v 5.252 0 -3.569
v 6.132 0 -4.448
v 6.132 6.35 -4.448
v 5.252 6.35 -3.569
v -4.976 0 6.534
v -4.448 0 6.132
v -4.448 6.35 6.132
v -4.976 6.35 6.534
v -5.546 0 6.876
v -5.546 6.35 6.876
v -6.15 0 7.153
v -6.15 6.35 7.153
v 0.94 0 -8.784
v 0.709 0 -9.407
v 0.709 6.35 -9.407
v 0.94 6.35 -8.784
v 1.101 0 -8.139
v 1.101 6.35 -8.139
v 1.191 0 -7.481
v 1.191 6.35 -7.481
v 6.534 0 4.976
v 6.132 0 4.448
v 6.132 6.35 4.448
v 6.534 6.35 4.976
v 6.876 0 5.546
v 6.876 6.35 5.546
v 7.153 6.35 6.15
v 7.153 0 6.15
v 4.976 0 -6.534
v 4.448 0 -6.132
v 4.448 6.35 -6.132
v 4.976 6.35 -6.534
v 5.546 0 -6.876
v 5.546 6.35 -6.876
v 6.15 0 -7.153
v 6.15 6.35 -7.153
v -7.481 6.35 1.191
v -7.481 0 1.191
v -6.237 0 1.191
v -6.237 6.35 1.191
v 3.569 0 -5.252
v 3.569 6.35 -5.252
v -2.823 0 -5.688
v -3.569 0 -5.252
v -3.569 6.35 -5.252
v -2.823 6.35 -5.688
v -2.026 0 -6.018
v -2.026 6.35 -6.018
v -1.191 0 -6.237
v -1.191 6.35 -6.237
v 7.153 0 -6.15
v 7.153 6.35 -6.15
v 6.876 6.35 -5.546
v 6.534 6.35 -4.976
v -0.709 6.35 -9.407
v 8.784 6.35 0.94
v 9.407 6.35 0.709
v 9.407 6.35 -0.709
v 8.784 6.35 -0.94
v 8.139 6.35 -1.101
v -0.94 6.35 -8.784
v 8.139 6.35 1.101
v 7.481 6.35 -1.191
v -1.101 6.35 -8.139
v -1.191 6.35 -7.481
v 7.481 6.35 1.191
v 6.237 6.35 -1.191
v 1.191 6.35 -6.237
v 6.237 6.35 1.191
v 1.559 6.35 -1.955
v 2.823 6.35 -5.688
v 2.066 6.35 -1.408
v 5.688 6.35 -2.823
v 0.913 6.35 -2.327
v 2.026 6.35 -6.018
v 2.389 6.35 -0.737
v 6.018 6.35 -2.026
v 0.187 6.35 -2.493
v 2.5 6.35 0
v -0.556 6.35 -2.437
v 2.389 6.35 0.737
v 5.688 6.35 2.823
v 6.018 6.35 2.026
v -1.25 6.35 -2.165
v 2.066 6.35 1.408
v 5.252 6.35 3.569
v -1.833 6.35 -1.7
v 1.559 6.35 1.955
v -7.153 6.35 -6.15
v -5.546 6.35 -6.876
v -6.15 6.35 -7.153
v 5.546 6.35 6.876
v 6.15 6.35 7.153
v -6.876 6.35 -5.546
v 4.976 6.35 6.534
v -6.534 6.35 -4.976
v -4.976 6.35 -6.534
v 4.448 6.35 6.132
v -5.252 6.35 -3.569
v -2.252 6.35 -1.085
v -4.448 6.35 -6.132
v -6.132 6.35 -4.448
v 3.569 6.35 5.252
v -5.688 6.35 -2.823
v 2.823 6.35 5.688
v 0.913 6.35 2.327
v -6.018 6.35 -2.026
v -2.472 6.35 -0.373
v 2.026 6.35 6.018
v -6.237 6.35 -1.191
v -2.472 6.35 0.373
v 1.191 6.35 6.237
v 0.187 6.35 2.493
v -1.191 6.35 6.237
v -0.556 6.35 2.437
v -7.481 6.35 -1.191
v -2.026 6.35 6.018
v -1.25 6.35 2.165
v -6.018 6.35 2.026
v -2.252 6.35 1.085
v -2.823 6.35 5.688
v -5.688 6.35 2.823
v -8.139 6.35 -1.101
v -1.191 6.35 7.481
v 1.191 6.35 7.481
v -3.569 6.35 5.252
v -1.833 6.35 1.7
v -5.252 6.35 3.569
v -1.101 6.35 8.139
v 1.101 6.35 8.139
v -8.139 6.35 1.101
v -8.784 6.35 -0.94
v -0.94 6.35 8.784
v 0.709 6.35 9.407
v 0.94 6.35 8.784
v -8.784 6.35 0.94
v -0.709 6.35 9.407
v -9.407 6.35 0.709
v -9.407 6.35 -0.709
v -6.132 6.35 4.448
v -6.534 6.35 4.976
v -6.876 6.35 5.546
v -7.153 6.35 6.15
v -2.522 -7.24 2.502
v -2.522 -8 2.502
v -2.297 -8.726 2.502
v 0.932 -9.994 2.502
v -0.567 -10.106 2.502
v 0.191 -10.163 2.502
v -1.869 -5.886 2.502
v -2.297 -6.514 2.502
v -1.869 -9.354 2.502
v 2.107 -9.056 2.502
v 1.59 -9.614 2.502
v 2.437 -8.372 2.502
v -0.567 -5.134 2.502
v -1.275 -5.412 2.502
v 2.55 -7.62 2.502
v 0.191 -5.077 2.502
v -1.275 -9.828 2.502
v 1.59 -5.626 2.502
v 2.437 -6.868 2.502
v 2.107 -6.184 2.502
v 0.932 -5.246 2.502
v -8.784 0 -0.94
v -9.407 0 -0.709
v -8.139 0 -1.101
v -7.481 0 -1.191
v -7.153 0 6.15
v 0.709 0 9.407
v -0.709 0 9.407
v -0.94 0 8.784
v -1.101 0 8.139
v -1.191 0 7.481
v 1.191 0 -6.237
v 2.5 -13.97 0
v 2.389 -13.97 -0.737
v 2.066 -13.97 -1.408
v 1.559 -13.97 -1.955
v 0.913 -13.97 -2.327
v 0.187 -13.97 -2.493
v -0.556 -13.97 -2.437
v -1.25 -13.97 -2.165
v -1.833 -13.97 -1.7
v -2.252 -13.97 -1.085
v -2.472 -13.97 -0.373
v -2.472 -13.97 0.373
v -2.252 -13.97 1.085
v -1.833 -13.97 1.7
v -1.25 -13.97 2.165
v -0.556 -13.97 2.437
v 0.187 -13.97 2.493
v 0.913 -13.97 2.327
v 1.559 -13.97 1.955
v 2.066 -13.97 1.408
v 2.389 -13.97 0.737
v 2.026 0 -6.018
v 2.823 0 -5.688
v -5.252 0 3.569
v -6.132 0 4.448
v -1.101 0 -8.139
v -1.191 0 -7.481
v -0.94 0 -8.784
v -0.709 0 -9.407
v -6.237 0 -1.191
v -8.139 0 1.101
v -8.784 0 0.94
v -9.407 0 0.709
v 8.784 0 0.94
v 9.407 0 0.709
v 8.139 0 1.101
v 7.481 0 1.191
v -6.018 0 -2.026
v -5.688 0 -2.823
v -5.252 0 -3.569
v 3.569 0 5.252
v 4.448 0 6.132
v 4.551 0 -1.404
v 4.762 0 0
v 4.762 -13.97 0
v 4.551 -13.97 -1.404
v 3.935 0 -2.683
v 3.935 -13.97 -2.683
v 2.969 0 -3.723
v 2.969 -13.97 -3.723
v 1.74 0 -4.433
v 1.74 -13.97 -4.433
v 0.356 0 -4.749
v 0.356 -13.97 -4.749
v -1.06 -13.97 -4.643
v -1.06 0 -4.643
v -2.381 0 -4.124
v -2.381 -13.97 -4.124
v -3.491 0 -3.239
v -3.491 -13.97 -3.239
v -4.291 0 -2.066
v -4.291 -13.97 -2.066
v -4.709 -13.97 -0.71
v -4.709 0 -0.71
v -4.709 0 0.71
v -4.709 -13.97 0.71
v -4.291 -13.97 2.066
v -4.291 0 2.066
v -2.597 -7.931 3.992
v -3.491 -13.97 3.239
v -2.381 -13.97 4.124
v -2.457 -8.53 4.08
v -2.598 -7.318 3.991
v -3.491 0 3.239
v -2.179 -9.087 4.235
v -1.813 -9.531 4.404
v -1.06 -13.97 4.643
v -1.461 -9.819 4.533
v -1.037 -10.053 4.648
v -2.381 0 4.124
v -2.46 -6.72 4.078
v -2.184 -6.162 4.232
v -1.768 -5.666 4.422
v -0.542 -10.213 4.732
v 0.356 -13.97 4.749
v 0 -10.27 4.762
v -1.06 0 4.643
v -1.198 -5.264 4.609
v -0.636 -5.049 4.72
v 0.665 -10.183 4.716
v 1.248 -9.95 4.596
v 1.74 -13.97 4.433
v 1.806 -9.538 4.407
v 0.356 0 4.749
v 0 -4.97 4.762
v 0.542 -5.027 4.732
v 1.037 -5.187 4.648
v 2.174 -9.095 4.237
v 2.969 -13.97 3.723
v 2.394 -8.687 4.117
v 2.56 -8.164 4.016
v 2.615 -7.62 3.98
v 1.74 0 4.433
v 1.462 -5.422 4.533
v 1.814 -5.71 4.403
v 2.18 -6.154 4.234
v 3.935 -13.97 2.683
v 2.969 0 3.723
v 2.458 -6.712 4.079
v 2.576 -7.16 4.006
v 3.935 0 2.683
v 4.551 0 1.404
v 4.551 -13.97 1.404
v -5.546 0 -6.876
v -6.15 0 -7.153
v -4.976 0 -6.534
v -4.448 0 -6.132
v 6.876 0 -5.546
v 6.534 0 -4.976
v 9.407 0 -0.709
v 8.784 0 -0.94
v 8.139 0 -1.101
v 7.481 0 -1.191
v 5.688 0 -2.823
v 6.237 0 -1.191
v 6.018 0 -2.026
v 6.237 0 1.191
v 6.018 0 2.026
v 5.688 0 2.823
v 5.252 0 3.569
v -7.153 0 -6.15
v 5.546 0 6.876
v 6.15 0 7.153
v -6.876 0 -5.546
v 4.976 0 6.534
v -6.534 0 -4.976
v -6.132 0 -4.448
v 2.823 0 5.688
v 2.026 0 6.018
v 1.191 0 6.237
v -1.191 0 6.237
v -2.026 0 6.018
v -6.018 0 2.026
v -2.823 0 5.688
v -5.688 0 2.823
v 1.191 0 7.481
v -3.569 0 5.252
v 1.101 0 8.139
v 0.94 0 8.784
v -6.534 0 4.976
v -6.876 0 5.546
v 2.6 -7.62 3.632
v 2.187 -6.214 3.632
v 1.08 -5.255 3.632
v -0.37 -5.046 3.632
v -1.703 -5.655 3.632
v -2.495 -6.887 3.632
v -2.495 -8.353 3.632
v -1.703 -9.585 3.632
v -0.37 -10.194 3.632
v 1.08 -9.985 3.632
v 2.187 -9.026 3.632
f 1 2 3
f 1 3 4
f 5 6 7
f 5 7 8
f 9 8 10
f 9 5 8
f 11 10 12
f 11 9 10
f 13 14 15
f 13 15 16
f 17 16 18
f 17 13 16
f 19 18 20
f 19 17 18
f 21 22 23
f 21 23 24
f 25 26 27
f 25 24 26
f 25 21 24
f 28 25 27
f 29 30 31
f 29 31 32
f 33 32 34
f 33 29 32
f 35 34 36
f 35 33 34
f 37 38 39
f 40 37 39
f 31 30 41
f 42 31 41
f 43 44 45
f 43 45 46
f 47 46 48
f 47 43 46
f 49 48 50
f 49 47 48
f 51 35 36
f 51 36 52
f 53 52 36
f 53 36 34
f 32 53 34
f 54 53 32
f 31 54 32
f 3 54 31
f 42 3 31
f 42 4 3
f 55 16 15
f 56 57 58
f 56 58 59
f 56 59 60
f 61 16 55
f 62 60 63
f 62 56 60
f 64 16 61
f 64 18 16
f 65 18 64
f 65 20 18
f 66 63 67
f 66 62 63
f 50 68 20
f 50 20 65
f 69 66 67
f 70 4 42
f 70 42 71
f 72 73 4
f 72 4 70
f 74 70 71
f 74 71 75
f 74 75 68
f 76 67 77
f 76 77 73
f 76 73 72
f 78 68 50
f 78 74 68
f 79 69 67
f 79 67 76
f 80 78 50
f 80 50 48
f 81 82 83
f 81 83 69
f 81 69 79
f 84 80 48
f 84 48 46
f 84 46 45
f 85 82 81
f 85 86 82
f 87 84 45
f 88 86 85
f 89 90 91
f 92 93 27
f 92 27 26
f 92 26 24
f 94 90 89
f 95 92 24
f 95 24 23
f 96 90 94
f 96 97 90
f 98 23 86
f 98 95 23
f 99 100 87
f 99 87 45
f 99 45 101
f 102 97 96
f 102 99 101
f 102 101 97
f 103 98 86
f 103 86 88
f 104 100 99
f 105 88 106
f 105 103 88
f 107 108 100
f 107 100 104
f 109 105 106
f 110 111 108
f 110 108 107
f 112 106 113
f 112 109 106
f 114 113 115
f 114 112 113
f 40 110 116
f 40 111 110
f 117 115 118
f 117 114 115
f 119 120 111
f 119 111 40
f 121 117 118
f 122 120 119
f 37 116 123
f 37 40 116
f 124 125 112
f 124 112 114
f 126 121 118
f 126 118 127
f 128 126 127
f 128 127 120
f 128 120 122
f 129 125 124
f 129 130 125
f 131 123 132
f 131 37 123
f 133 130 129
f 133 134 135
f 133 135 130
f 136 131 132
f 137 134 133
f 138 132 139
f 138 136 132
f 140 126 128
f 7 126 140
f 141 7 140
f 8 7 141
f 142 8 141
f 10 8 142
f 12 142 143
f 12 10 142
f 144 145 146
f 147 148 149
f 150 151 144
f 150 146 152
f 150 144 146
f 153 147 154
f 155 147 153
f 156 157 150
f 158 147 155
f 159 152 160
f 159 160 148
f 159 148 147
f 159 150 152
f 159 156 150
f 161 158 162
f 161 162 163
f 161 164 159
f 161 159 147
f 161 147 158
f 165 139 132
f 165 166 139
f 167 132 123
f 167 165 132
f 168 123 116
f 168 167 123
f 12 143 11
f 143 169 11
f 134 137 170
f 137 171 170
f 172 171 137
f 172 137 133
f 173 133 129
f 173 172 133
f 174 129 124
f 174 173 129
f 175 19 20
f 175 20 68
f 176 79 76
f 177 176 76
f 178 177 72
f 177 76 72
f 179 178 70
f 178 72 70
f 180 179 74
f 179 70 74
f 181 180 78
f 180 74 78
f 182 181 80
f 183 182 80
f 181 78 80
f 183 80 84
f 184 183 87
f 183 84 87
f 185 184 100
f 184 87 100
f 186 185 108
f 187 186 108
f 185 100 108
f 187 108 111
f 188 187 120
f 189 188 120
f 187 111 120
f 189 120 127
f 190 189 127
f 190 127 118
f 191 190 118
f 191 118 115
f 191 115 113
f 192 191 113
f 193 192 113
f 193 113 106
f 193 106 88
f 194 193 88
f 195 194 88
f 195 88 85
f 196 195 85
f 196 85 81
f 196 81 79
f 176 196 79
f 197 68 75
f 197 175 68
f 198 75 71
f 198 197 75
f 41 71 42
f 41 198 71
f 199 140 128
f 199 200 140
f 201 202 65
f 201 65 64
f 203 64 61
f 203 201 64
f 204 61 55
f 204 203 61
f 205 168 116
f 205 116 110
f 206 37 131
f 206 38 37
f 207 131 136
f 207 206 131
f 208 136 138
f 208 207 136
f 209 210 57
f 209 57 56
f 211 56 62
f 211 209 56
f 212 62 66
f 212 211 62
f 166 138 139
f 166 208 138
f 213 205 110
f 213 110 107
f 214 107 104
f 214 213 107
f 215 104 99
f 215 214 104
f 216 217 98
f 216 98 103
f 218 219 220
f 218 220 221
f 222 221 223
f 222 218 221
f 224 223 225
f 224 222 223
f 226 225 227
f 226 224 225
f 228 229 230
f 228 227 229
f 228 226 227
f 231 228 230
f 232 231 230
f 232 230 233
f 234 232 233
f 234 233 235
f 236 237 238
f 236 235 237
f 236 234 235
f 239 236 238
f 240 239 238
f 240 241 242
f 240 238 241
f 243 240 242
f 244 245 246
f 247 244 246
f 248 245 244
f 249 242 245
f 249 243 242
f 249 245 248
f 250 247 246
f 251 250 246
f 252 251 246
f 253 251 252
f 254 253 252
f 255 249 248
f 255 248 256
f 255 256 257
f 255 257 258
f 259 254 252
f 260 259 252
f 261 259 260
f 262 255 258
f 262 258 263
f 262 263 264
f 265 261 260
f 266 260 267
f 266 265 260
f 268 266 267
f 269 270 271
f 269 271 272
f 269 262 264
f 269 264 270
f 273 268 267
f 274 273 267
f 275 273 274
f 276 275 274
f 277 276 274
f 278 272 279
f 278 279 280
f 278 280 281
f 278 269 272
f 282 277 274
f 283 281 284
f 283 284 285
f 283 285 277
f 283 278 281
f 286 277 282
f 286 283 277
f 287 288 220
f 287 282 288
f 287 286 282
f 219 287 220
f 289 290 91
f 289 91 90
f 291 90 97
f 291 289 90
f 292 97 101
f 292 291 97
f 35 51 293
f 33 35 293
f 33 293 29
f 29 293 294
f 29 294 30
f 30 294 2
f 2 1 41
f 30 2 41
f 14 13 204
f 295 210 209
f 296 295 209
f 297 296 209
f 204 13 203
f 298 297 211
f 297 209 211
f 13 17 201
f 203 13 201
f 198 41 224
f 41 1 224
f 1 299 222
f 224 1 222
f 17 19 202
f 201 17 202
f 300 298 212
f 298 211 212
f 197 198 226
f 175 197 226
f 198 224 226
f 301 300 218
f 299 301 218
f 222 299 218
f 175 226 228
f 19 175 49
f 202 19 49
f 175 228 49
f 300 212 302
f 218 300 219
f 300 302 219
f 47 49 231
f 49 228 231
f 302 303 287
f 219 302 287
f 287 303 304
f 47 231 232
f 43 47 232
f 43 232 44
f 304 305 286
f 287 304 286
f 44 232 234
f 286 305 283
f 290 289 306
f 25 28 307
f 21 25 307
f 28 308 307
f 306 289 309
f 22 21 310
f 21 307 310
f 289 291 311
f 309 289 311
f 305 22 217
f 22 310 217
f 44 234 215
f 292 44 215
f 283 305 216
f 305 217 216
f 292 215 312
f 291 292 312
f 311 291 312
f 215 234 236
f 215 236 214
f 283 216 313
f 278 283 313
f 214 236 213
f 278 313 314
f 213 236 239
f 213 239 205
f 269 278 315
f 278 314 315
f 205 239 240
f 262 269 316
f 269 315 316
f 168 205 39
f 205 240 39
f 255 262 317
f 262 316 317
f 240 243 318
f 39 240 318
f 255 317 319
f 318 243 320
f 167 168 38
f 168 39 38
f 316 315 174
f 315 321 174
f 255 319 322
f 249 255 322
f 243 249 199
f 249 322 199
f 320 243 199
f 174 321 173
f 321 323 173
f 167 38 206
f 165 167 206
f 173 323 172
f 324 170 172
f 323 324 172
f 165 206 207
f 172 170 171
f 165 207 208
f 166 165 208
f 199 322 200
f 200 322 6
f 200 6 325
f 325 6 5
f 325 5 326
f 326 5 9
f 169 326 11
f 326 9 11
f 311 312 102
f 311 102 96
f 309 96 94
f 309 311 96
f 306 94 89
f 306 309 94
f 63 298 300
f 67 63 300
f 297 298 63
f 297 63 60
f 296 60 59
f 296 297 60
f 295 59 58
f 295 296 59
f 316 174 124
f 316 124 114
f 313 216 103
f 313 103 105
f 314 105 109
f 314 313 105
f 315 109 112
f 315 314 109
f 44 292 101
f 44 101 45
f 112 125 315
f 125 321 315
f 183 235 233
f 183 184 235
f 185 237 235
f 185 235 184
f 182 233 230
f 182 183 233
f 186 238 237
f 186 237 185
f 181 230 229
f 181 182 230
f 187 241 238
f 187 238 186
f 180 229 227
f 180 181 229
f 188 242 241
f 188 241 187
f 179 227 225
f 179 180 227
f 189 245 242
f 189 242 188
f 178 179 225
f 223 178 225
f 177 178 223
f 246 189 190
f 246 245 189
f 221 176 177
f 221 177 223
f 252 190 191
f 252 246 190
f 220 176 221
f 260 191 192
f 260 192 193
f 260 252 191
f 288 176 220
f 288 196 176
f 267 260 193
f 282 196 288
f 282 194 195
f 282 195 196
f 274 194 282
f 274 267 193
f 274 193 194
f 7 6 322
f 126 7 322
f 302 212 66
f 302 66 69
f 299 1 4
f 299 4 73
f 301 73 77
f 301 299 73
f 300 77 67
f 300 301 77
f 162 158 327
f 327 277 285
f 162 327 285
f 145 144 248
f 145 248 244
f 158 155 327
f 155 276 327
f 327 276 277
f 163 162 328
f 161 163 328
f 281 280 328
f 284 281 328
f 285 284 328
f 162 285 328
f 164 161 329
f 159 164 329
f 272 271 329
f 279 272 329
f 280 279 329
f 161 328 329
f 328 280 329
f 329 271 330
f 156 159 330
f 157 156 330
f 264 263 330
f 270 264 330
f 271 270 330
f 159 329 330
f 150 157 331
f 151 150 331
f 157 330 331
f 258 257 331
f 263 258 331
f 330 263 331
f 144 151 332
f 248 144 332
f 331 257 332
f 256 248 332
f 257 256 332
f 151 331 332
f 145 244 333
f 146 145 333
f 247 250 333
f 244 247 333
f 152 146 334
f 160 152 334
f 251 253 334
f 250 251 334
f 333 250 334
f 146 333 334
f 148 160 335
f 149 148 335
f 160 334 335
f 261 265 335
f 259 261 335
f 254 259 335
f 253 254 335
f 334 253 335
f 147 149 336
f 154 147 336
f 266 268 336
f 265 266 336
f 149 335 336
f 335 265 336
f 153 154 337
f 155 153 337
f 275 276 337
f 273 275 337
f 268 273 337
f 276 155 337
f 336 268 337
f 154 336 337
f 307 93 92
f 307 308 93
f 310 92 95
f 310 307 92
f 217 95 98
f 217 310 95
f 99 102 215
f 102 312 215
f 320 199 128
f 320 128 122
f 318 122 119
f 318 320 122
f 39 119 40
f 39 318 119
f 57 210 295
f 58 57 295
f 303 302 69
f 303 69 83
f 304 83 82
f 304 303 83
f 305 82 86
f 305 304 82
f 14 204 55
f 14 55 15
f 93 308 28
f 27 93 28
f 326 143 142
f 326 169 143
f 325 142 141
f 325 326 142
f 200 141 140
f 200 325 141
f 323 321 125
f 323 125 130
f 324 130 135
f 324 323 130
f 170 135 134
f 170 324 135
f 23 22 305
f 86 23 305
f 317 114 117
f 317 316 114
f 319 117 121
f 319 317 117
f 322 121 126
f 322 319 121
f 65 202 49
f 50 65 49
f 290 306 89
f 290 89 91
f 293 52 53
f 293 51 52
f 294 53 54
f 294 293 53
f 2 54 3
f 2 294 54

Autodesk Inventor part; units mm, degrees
ref_plane "YZ Plane" through (0, 0, 0) normal (1, 0, 0) x (0, 1, 0)
sketch "Sketch1" plane through (0, 0, 0) normal (0, 1, 0) x (-1, 0, 0)
  line L0 (-7.4806, -1.1906) -> (-6.2374, -1.1906)
  arc A0 (-9.4068, -0.7091) -> (-7.4806, -1.1906) centre (-6.9988, 4.8297) ccw
  line L1 (-9.4068, 0) -> (-9.4068, -0.7091)
  line L2 (-9.4068, 0) -> (-9.4068, 0.7091)
  line L3 (-7.4806, 1.1906) -> (-6.2374, 1.1906)
  arc A1 (-7.4806, 1.1906) -> (-9.4068, 0.7091) centre (-6.9988, -4.8297) ccw
  line L4 (-7.4806, -1.1906) -> (-6.2374, -1.1906)
  arc A2 (-9.4068, -0.7091) -> (-7.4806, -1.1906) centre (-6.9988, 4.8297) ccw
  line L5 (-9.4068, 0) -> (-9.4068, -0.7091)
  line L6 (-9.4068, 0) -> (-9.4068, 0.7091)
  line L7 (-7.4806, 1.1906) -> (-6.2374, 1.1906)
  arc A3 (-7.4806, 1.1906) -> (-9.4068, 0.7091) centre (-6.9988, -4.8297) ccw
  line L8 (-4.4477, -6.1315) -> (-3.5686, -5.2524)
  line L9 (-4.4477, -6.1315) -> (-3.5686, -5.2524)
  line L10 (-6.6516, -6.6516) -> (-6.1502, -7.153)
  line L11 (-6.6516, -6.6516) -> (-6.1502, -7.153)
  line L12 (-6.6516, -6.6516) -> (-7.153, -6.1502)
  line L13 (-6.6516, -6.6516) -> (-7.153, -6.1502)
  line L14 (-6.1315, -4.4477) -> (-5.2524, -3.5686)
  line L15 (-6.1315, -4.4477) -> (-5.2524, -3.5686)
  arc A4 (-6.1315, -4.4477) -> (-7.153, -6.1502) centre (-1.5338, -8.364) ccw
  arc A5 (-6.1315, -4.4477) -> (-7.153, -6.1502) centre (-1.5338, -8.364) ccw
  arc A6 (-6.1502, -7.153) -> (-4.4477, -6.1315) centre (-8.364, -1.5338) ccw
  arc A7 (-6.1502, -7.153) -> (-4.4477, -6.1315) centre (-8.364, -1.5338) ccw
  line L16 (1.1906, -7.4806) -> (1.1906, -6.2374)
  line L17 (1.1906, -7.4806) -> (1.1906, -6.2374)
  line L18 (0, -9.4068) -> (0.7091, -9.4068)
  line L19 (0, -9.4068) -> (0.7091, -9.4068)
  line L20 (0, -9.4068) -> (-0.7091, -9.4068)
  line L21 (0, -9.4068) -> (-0.7091, -9.4068)
  line L22 (-1.1906, -7.4806) -> (-1.1906, -6.2374)
  line L23 (-1.1906, -7.4806) -> (-1.1906, -6.2374)
  arc A8 (-1.1906, -7.4806) -> (-0.7091, -9.4068) centre (4.8297, -6.9988) ccw
  arc A9 (-1.1906, -7.4806) -> (-0.7091, -9.4068) centre (4.8297, -6.9988) ccw
  arc A10 (0.7091, -9.4068) -> (1.1906, -7.4806) centre (-4.8297, -6.9988) ccw
  arc A11 (0.7091, -9.4068) -> (1.1906, -7.4806) centre (-4.8297, -6.9988) ccw
  line L24 (6.1315, -4.4477) -> (5.2524, -3.5686)
  line L25 (6.1315, -4.4477) -> (5.2524, -3.5686)
  line L26 (6.6516, -6.6516) -> (7.153, -6.1502)
  line L27 (6.6516, -6.6516) -> (7.153, -6.1502)
  line L28 (6.6516, -6.6516) -> (6.1502, -7.153)
  line L29 (6.6516, -6.6516) -> (6.1502, -7.153)
  line L30 (4.4477, -6.1315) -> (3.5686, -5.2524)
  line L31 (4.4477, -6.1315) -> (3.5686, -5.2524)
  arc A12 (4.4477, -6.1315) -> (6.1502, -7.153) centre (8.364, -1.5338) ccw
  arc A13 (4.4477, -6.1315) -> (6.1502, -7.153) centre (8.364, -1.5338) ccw
  arc A14 (7.153, -6.1502) -> (6.1315, -4.4477) centre (1.5338, -8.364) ccw
  arc A15 (7.153, -6.1502) -> (6.1315, -4.4477) centre (1.5338, -8.364) ccw
  line L32 (7.4806, 1.1906) -> (6.2374, 1.1906)
  line L33 (7.4806, 1.1906) -> (6.2374, 1.1906)
  line L34 (9.4068, 0) -> (9.4068, 0.7091)
  line L35 (9.4068, 0) -> (9.4068, 0.7091)
  line L36 (9.4068, 0) -> (9.4068, -0.7091)
  line L37 (9.4068, 0) -> (9.4068, -0.7091)
  line L38 (7.4806, -1.1906) -> (6.2374, -1.1906)
  line L39 (7.4806, -1.1906) -> (6.2374, -1.1906)
  arc A16 (7.4806, -1.1906) -> (9.4068, -0.7091) centre (6.9988, 4.8297) ccw
  arc A17 (7.4806, -1.1906) -> (9.4068, -0.7091) centre (6.9988, 4.8297) ccw
  arc A18 (9.4068, 0.7091) -> (7.4806, 1.1906) centre (6.9988, -4.8297) ccw
  arc A19 (9.4068, 0.7091) -> (7.4806, 1.1906) centre (6.9988, -4.8297) ccw
  line L40 (4.4477, 6.1315) -> (3.5686, 5.2524)
  line L41 (4.4477, 6.1315) -> (3.5686, 5.2524)
  line L42 (6.6516, 6.6516) -> (6.1502, 7.153)
  line L43 (6.6516, 6.6516) -> (6.1502, 7.153)
  line L44 (6.6516, 6.6516) -> (7.153, 6.1502)
  line L45 (6.6516, 6.6516) -> (7.153, 6.1502)
  line L46 (6.1315, 4.4477) -> (5.2524, 3.5686)
  line L47 (6.1315, 4.4477) -> (5.2524, 3.5686)
  arc A20 (6.1315, 4.4477) -> (7.153, 6.1502) centre (1.5338, 8.364) ccw
  arc A21 (6.1315, 4.4477) -> (7.153, 6.1502) centre (1.5338, 8.364) ccw
  arc A22 (6.1502, 7.153) -> (4.4477, 6.1315) centre (8.364, 1.5338) ccw
  arc A23 (6.1502, 7.153) -> (4.4477, 6.1315) centre (8.364, 1.5338) ccw
  line L48 (-1.1906, 7.4806) -> (-1.1906, 6.2374)
  line L49 (-1.1906, 7.4806) -> (-1.1906, 6.2374)
  line L50 (0, 9.4068) -> (-0.7091, 9.4068)
  line L51 (0, 9.4068) -> (-0.7091, 9.4068)
  line L52 (0, 9.4068) -> (0.7091, 9.4068)
  line L53 (0, 9.4068) -> (0.7091, 9.4068)
  line L54 (1.1906, 7.4806) -> (1.1906, 6.2374)
  line L55 (1.1906, 7.4806) -> (1.1906, 6.2374)
  arc A24 (1.1906, 7.4806) -> (0.7091, 9.4068) centre (-4.8297, 6.9988) ccw
  arc A25 (1.1906, 7.4806) -> (0.7091, 9.4068) centre (-4.8297, 6.9988) ccw
  arc A26 (-0.7091, 9.4068) -> (-1.1906, 7.4806) centre (4.8297, 6.9988) ccw
  arc A27 (-0.7091, 9.4068) -> (-1.1906, 7.4806) centre (4.8297, 6.9988) ccw
  line L56 (-6.1315, 4.4477) -> (-5.2524, 3.5686)
  line L57 (-6.1315, 4.4477) -> (-5.2524, 3.5686)
  line L58 (-6.6516, 6.6516) -> (-7.153, 6.1502)
  line L59 (-6.6516, 6.6516) -> (-7.153, 6.1502)
  line L60 (-6.6516, 6.6516) -> (-6.1502, 7.153)
  line L61 (-6.6516, 6.6516) -> (-6.1502, 7.153)
  line L62 (-4.4477, 6.1315) -> (-3.5686, 5.2524)
  line L63 (-4.4477, 6.1315) -> (-3.5686, 5.2524)
  arc A28 (-4.4477, 6.1315) -> (-6.1502, 7.153) centre (-8.364, 1.5338) ccw
  arc A29 (-4.4477, 6.1315) -> (-6.1502, 7.153) centre (-8.364, 1.5338) ccw
  arc A30 (-7.153, 6.1502) -> (-6.1315, 4.4477) centre (-1.5338, 8.364) ccw
  arc A31 (-7.153, 6.1502) -> (-6.1315, 4.4477) centre (-1.5338, 8.364) ccw
  arc A32 (1.1906, -6.2374) -> (3.5686, -5.2524) centre (0, 0) ccw
  arc A33 (-3.5686, -5.2524) -> (-1.1906, -6.2374) centre (0, 0) ccw
  arc A34 (-6.2374, -1.1906) -> (-5.2524, -3.5686) centre (0, 0) ccw
  arc A35 (-5.2524, 3.5686) -> (-6.2374, 1.1906) centre (0, 0) ccw
  arc A36 (-1.1906, 6.2374) -> (-3.5686, 5.2524) centre (0, 0) ccw
  arc A37 (3.5686, 5.2524) -> (1.1906, 6.2374) centre (0, 0) ccw
  arc A38 (5.2524, -3.5686) -> (6.2374, -1.1906) centre (0, 0) ccw
  arc A39 (6.2374, 1.1906) -> (5.2524, 3.5686) centre (0, 0) ccw
  point P0 (-6.907, -0.3718)
  point P1 (-6.907, 0.3718)
  point P2 (-6.907, -0.3718)
  point P3 (-6.907, 0.3718)
  point P4 (-4.6211, -5.1469)
  point P5 (-4.6211, -5.1469)
  point P6 (-5.1469, -4.6211)
  point P7 (-5.1469, -4.6211)
  point P8 (0.3718, -6.907)
  point P9 (0.3718, -6.907)
  point P10 (-0.3718, -6.907)
  point P11 (-0.3718, -6.907)
  point P12 (5.1469, -4.6211)
  point P13 (5.1469, -4.6211)
  point P14 (4.6211, -5.1469)
  point P15 (4.6211, -5.1469)
  point P16 (6.907, 0.3718)
  point P17 (6.907, 0.3718)
  point P18 (6.907, -0.3718)
  point P19 (6.907, -0.3718)
  point P20 (4.6211, 5.1469)
  point P21 (4.6211, 5.1469)
  point P22 (5.1469, 4.6211)
  point P23 (5.1469, 4.6211)
  point P24 (-0.3718, 6.907)
  point P25 (-0.3718, 6.907)
  point P26 (0.3718, 6.907)
  point P27 (0.3718, 6.907)
  point P28 (-5.1469, 4.6211)
  point P29 (-5.1469, 4.6211)
  point P30 (-4.6211, 5.1469)
  point P31 (-4.6211, 5.1469)
  dimension "d5" = 360
extrude "Extrusion1" add sketch "Sketch1" along normal blind 6.35
sketch "Sketch2" plane through (0, 0, 0) normal (0, -1, 0) x (1, 0, 0)
  circle A0 centre (0, 0) radius 4.7625
  dimension "d9" = 9.525
extrude "Extrusion2" add sketch "Sketch2" along normal blind 13.97
sketch "Sketch3" plane through (0, 6.35, 0) normal (0, 1, 0) x (1, 0, 0)
  circle A0 centre (0, 0) radius 2.5
  dimension "d12" = 5
extrude "Extrusion3" cut sketch "Sketch3" along normal through all both and the other way through all
ref_plane "Work Plane1" through (0, 0, 2.5019) normal (0, 0, 1) x (1, 0, 0)
ref_plane "Work Plane2" through (0, 0, 4.7625) normal (0, 0, 1) x (1, 0, 0)
sketch "Sketch5" plane through (0, 0, 2.5019) normal (0, 0, 1) x (1, 0, 0)
  line L0 (2.5, -13.97) -> (-2.5, -13.97) construction
  line L1 (0.7091, 6.35) -> (-0.7091, 6.35) construction
  line L2 (0, -13.97) -> (0, -7.62) construction
  circle A0 centre (0, -7.62) radius 2.55
  point P0 (0, 0)
  dimension "d17" = 6.35
  dimension "d18" = 5.1
sketch "Sketch6" plane through (0, 0, 4.7625) normal (0, 0, 1) x (1, 0, 0)
  line L0 (2.5, -13.97) -> (-2.5, -13.97) construction
  line L1 (0, -13.97) -> (0, -7.62) construction
  circle A0 centre (0, -7.62) radius 2.65
  point P0 (0, 0)
  dimension "d19" = 6.35
  dimension "d20" = 5.3
loft "Loft1" cut profiles "Sketch5", "Sketch6"
properties part number "Small Gear"
